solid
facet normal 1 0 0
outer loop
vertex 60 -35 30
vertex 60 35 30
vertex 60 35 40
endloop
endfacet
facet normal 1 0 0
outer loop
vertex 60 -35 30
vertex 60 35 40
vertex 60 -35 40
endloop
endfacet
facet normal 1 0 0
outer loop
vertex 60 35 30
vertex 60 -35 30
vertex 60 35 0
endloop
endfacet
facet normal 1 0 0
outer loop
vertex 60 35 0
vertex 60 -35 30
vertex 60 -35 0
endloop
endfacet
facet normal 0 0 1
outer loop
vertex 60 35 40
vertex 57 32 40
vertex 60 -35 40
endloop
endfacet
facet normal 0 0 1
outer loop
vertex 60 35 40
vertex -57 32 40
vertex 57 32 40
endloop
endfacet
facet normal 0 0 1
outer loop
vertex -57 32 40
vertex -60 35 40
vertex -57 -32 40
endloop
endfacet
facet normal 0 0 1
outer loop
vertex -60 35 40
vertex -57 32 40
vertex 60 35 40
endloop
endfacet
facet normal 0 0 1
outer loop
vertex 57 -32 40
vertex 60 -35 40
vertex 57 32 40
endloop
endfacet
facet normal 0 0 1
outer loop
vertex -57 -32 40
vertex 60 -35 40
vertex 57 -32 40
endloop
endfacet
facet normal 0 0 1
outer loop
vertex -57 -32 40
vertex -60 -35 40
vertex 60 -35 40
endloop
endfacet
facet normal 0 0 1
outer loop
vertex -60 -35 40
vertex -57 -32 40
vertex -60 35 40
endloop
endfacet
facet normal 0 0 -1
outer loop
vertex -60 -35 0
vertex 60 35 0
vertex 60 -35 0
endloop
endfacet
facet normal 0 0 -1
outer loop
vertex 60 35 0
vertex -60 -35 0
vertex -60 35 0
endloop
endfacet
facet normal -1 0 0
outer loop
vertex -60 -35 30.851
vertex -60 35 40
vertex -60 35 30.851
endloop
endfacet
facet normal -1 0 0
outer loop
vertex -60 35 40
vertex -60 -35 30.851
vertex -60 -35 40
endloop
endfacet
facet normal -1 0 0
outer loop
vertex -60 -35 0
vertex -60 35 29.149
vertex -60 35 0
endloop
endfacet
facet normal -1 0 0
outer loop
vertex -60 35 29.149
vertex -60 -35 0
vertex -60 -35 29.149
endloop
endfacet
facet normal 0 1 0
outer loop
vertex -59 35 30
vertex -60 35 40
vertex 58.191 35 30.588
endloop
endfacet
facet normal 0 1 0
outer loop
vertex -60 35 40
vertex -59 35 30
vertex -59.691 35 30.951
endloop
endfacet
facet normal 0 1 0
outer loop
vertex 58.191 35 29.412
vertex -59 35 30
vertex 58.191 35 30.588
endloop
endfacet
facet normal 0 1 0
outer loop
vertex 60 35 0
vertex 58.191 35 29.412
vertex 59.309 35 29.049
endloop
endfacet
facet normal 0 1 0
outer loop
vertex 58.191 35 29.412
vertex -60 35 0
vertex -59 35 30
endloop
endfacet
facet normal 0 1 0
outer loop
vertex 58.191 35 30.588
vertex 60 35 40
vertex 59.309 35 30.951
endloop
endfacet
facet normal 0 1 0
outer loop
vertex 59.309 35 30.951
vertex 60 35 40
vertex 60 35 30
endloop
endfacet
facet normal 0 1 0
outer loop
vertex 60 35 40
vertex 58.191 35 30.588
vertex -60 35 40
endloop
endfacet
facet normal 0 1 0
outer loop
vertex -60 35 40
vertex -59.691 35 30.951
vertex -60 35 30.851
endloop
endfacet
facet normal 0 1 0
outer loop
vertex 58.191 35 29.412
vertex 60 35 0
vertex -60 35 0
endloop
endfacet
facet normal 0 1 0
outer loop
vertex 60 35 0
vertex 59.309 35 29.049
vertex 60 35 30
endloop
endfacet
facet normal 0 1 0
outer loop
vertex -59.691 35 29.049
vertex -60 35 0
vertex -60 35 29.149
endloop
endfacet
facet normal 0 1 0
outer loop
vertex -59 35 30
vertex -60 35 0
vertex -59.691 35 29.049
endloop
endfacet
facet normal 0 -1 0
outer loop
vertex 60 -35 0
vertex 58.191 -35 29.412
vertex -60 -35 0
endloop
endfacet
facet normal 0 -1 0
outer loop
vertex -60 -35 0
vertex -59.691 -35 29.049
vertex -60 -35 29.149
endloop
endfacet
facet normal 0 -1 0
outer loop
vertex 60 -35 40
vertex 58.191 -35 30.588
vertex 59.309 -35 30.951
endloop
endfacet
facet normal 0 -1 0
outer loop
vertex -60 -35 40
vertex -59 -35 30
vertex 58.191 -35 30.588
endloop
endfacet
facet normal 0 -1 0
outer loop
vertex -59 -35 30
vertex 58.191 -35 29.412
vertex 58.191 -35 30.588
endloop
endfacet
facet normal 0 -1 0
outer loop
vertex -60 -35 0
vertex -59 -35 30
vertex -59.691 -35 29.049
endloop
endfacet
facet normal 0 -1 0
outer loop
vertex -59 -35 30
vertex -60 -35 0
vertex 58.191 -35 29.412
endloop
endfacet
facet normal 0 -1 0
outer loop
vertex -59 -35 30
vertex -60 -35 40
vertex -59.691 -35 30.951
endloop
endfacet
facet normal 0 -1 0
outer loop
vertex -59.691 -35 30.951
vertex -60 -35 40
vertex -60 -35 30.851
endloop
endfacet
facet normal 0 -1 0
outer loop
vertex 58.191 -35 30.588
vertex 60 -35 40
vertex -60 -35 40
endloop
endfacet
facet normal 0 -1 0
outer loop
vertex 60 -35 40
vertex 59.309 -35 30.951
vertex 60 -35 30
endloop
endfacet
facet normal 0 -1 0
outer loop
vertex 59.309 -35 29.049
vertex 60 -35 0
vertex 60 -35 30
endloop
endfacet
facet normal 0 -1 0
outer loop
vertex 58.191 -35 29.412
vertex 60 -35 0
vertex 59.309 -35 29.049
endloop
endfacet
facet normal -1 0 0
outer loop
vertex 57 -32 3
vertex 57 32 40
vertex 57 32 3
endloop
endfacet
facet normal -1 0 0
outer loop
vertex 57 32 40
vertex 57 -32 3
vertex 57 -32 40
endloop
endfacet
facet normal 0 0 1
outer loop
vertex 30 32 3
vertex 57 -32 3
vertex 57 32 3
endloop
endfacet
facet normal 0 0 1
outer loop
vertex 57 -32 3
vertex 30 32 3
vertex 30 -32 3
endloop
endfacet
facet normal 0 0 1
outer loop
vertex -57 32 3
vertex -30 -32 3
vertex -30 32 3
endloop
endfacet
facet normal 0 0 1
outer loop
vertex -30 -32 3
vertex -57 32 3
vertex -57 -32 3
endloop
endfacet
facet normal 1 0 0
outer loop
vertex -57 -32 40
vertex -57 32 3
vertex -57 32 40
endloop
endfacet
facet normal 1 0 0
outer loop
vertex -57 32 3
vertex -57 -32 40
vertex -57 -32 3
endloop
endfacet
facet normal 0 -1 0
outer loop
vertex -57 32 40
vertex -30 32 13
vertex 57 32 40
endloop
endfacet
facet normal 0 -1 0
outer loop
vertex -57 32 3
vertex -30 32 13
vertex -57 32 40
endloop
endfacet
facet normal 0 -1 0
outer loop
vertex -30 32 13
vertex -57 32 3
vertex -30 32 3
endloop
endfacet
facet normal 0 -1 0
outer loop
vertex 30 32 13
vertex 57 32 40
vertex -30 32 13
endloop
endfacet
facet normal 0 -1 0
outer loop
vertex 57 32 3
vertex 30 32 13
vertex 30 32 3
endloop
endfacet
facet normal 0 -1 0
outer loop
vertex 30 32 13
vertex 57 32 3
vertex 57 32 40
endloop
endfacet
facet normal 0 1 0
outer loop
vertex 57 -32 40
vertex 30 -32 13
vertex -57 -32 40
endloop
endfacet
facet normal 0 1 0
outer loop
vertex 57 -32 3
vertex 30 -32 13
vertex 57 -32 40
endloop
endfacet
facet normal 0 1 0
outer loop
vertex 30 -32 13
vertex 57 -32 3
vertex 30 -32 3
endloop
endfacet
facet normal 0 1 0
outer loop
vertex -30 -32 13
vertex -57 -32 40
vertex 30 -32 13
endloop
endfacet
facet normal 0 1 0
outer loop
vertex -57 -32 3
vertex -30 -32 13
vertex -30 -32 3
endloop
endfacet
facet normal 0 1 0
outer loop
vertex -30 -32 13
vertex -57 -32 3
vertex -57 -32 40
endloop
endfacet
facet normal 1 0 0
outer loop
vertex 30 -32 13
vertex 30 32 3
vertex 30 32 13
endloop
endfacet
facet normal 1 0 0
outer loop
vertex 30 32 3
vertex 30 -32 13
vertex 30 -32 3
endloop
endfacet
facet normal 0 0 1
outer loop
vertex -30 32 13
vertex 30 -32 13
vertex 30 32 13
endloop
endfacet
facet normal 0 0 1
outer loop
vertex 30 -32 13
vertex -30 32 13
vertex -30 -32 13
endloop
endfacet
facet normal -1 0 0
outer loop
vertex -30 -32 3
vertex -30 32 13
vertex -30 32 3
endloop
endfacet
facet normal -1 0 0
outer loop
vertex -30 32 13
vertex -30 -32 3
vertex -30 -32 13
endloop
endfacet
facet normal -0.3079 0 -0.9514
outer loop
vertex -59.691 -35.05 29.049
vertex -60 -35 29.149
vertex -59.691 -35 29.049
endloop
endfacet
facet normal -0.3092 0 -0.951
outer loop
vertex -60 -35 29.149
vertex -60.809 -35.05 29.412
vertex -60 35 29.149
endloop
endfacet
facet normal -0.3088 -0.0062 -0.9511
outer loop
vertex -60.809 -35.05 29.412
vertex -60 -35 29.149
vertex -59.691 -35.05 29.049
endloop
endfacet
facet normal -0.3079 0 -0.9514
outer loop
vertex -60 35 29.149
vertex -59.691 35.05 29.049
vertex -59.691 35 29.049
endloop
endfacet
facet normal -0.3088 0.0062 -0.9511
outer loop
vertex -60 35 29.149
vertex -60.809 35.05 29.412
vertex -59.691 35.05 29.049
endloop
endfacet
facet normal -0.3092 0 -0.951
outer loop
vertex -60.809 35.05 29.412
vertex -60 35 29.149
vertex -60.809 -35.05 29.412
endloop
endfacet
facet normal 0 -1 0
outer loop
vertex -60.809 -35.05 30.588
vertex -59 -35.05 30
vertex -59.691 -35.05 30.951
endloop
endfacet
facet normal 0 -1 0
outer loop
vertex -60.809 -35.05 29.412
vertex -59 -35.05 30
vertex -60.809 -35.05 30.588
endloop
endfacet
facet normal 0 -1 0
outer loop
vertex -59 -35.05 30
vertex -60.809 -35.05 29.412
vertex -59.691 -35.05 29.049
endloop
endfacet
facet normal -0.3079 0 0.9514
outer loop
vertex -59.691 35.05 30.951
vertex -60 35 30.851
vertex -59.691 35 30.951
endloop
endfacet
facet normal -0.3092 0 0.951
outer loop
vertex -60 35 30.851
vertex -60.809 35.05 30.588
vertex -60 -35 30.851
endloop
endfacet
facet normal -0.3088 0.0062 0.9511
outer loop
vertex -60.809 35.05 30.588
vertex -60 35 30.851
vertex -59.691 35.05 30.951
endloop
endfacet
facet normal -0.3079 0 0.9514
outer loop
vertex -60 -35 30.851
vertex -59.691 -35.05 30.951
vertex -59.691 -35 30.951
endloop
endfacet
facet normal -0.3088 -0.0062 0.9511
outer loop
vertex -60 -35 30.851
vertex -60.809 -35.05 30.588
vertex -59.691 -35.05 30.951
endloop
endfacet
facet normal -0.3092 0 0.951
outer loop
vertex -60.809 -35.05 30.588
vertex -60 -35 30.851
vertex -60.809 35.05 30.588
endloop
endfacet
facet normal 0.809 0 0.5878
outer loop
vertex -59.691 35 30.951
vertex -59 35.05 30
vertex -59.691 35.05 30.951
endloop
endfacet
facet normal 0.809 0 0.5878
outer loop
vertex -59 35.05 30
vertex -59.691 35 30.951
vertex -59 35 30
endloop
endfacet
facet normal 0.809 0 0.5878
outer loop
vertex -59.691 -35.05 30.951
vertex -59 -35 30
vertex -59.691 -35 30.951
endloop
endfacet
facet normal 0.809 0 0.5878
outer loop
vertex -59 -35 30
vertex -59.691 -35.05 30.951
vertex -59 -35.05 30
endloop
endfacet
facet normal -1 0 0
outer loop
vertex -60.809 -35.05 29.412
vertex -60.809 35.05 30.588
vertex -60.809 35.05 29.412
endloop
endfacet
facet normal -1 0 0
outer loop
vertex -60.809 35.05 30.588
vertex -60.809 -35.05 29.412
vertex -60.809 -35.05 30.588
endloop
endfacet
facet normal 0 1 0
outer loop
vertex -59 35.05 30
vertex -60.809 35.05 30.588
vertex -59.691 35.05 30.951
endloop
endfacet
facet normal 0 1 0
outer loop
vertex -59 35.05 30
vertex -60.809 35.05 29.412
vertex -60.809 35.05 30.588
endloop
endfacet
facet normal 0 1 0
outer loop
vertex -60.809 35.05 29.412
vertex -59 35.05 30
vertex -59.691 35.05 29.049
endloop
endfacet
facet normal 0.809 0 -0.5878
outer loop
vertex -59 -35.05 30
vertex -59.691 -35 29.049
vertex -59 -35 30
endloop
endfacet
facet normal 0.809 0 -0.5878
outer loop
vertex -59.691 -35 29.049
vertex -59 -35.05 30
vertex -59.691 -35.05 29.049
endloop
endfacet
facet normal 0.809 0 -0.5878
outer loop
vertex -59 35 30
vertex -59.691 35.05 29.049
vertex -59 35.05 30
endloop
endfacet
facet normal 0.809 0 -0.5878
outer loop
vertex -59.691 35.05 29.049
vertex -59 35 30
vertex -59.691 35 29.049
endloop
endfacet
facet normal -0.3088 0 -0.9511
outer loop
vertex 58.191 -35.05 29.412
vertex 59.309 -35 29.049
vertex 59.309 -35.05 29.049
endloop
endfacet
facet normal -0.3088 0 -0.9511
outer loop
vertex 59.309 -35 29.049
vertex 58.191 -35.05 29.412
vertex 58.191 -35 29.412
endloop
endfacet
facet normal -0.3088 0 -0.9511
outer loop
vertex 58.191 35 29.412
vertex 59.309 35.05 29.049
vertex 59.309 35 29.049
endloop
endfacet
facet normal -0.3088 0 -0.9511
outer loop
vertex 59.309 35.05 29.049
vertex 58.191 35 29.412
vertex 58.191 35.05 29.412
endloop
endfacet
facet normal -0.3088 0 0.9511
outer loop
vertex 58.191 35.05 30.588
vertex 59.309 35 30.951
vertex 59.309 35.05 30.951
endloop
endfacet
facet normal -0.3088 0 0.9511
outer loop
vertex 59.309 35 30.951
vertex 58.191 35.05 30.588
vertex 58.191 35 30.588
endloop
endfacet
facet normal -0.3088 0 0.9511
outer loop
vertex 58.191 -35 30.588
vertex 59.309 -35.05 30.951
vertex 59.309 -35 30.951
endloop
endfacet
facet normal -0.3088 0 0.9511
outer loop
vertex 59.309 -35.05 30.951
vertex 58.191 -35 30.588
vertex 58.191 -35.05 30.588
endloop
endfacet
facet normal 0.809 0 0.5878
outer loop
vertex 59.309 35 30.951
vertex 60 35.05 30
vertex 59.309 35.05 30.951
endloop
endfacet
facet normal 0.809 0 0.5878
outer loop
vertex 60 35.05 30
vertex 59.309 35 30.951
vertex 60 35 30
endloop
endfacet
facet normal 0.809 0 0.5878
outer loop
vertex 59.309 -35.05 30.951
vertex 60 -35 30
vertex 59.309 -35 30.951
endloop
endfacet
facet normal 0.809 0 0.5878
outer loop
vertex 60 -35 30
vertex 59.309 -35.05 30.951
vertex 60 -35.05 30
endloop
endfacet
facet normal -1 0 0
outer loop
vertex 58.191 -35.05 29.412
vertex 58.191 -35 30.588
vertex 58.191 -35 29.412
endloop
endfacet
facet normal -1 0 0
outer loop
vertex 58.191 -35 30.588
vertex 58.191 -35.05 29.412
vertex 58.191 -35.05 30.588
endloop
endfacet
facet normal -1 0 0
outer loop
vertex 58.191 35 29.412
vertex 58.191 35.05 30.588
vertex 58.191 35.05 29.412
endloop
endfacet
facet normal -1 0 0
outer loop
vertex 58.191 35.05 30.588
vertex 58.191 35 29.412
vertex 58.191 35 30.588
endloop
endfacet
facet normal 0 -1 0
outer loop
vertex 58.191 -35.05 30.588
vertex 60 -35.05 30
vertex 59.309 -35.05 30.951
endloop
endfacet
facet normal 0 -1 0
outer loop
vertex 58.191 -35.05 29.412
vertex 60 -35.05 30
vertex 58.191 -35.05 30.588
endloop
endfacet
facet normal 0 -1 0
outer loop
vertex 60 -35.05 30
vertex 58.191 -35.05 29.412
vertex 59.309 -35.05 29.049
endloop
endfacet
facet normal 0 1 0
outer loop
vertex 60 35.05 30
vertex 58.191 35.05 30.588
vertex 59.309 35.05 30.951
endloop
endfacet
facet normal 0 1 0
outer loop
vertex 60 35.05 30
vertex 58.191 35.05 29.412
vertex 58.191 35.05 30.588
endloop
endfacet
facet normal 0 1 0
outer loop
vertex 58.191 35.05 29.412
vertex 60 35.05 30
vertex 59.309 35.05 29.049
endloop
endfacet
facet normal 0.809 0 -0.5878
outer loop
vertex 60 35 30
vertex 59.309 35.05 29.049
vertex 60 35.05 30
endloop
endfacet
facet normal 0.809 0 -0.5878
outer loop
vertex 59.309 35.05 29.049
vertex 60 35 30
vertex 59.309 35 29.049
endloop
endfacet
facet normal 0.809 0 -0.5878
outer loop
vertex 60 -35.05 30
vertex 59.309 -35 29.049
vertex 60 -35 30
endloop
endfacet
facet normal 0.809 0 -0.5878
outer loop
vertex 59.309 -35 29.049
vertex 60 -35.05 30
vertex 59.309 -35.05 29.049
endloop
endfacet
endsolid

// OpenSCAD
// --- Buffer tank for mini horizontal gel-electrophoresis box ---
// Print orientation: resting on XY plane at z = 0, building upward (+Z)
// Centre on origin in X and Y

// Outer dimensions
outer_x = 120;       // mm, outer length in X
outer_y = 70;         // mm, outer width in Y
outer_z = 40;         // mm, outer height in Z

// Wall and floor thickness
wall_thick = 3;       // mm, wall thickness
floor_thick = 3;      // mm, floor thickness

// Gel platform
platform_length = 60; // mm, length in X (centred)
platform_top_z = 13;  // mm, top of platform above inner floor (z = 13)
platform_thickness = platform_top_z - floor_thick; // 10 mm thick platform

// Electrode wire holes
wire_hole_dia = 2;    // mm, diameter of wire holes
wire_hole_z = 30;     // mm, height of wire holes

// Inner dimensions
inner_x = outer_x - 2 * wall_thick;
inner_y = outer_y - 2 * wall_thick;

// Platform half-lengths
plat_half_x = platform_length / 2;

// Build the tank
module tank() {
    union() {
        // Tank walls and floor (hollow box, open at top)
        difference() {
            // Outer block (centered on origin)
            translate([-outer_x/2, -outer_y/2, 0]) {
                cube([outer_x, outer_y, outer_z], center = false);
            }
            
            // Inner cavity (open at top, centered)
            translate([-inner_x/2, -inner_y/2, floor_thick]) {
                cube([inner_x, inner_y, outer_z - floor_thick], center = false);
            }
        }
        
        // Gel platform (solid, centered in X and Y)
        translate([-plat_half_x, -inner_y/2, floor_thick]) {
            cube([platform_length, inner_y, platform_thickness], center = false);
        }
    }
    
    // Drill electrode wire holes through end walls (X ends) at y = 0
    for (x_pos = [0, outer_x - 1]) {
        translate([x_pos - outer_x/2, 0, wire_hole_z]) {
            rotate([90, 0, 0]) {
                cylinder(d = wire_hole_dia, h = outer_y + 0.1, center = true);
            }
        }
    }
}

tank();
